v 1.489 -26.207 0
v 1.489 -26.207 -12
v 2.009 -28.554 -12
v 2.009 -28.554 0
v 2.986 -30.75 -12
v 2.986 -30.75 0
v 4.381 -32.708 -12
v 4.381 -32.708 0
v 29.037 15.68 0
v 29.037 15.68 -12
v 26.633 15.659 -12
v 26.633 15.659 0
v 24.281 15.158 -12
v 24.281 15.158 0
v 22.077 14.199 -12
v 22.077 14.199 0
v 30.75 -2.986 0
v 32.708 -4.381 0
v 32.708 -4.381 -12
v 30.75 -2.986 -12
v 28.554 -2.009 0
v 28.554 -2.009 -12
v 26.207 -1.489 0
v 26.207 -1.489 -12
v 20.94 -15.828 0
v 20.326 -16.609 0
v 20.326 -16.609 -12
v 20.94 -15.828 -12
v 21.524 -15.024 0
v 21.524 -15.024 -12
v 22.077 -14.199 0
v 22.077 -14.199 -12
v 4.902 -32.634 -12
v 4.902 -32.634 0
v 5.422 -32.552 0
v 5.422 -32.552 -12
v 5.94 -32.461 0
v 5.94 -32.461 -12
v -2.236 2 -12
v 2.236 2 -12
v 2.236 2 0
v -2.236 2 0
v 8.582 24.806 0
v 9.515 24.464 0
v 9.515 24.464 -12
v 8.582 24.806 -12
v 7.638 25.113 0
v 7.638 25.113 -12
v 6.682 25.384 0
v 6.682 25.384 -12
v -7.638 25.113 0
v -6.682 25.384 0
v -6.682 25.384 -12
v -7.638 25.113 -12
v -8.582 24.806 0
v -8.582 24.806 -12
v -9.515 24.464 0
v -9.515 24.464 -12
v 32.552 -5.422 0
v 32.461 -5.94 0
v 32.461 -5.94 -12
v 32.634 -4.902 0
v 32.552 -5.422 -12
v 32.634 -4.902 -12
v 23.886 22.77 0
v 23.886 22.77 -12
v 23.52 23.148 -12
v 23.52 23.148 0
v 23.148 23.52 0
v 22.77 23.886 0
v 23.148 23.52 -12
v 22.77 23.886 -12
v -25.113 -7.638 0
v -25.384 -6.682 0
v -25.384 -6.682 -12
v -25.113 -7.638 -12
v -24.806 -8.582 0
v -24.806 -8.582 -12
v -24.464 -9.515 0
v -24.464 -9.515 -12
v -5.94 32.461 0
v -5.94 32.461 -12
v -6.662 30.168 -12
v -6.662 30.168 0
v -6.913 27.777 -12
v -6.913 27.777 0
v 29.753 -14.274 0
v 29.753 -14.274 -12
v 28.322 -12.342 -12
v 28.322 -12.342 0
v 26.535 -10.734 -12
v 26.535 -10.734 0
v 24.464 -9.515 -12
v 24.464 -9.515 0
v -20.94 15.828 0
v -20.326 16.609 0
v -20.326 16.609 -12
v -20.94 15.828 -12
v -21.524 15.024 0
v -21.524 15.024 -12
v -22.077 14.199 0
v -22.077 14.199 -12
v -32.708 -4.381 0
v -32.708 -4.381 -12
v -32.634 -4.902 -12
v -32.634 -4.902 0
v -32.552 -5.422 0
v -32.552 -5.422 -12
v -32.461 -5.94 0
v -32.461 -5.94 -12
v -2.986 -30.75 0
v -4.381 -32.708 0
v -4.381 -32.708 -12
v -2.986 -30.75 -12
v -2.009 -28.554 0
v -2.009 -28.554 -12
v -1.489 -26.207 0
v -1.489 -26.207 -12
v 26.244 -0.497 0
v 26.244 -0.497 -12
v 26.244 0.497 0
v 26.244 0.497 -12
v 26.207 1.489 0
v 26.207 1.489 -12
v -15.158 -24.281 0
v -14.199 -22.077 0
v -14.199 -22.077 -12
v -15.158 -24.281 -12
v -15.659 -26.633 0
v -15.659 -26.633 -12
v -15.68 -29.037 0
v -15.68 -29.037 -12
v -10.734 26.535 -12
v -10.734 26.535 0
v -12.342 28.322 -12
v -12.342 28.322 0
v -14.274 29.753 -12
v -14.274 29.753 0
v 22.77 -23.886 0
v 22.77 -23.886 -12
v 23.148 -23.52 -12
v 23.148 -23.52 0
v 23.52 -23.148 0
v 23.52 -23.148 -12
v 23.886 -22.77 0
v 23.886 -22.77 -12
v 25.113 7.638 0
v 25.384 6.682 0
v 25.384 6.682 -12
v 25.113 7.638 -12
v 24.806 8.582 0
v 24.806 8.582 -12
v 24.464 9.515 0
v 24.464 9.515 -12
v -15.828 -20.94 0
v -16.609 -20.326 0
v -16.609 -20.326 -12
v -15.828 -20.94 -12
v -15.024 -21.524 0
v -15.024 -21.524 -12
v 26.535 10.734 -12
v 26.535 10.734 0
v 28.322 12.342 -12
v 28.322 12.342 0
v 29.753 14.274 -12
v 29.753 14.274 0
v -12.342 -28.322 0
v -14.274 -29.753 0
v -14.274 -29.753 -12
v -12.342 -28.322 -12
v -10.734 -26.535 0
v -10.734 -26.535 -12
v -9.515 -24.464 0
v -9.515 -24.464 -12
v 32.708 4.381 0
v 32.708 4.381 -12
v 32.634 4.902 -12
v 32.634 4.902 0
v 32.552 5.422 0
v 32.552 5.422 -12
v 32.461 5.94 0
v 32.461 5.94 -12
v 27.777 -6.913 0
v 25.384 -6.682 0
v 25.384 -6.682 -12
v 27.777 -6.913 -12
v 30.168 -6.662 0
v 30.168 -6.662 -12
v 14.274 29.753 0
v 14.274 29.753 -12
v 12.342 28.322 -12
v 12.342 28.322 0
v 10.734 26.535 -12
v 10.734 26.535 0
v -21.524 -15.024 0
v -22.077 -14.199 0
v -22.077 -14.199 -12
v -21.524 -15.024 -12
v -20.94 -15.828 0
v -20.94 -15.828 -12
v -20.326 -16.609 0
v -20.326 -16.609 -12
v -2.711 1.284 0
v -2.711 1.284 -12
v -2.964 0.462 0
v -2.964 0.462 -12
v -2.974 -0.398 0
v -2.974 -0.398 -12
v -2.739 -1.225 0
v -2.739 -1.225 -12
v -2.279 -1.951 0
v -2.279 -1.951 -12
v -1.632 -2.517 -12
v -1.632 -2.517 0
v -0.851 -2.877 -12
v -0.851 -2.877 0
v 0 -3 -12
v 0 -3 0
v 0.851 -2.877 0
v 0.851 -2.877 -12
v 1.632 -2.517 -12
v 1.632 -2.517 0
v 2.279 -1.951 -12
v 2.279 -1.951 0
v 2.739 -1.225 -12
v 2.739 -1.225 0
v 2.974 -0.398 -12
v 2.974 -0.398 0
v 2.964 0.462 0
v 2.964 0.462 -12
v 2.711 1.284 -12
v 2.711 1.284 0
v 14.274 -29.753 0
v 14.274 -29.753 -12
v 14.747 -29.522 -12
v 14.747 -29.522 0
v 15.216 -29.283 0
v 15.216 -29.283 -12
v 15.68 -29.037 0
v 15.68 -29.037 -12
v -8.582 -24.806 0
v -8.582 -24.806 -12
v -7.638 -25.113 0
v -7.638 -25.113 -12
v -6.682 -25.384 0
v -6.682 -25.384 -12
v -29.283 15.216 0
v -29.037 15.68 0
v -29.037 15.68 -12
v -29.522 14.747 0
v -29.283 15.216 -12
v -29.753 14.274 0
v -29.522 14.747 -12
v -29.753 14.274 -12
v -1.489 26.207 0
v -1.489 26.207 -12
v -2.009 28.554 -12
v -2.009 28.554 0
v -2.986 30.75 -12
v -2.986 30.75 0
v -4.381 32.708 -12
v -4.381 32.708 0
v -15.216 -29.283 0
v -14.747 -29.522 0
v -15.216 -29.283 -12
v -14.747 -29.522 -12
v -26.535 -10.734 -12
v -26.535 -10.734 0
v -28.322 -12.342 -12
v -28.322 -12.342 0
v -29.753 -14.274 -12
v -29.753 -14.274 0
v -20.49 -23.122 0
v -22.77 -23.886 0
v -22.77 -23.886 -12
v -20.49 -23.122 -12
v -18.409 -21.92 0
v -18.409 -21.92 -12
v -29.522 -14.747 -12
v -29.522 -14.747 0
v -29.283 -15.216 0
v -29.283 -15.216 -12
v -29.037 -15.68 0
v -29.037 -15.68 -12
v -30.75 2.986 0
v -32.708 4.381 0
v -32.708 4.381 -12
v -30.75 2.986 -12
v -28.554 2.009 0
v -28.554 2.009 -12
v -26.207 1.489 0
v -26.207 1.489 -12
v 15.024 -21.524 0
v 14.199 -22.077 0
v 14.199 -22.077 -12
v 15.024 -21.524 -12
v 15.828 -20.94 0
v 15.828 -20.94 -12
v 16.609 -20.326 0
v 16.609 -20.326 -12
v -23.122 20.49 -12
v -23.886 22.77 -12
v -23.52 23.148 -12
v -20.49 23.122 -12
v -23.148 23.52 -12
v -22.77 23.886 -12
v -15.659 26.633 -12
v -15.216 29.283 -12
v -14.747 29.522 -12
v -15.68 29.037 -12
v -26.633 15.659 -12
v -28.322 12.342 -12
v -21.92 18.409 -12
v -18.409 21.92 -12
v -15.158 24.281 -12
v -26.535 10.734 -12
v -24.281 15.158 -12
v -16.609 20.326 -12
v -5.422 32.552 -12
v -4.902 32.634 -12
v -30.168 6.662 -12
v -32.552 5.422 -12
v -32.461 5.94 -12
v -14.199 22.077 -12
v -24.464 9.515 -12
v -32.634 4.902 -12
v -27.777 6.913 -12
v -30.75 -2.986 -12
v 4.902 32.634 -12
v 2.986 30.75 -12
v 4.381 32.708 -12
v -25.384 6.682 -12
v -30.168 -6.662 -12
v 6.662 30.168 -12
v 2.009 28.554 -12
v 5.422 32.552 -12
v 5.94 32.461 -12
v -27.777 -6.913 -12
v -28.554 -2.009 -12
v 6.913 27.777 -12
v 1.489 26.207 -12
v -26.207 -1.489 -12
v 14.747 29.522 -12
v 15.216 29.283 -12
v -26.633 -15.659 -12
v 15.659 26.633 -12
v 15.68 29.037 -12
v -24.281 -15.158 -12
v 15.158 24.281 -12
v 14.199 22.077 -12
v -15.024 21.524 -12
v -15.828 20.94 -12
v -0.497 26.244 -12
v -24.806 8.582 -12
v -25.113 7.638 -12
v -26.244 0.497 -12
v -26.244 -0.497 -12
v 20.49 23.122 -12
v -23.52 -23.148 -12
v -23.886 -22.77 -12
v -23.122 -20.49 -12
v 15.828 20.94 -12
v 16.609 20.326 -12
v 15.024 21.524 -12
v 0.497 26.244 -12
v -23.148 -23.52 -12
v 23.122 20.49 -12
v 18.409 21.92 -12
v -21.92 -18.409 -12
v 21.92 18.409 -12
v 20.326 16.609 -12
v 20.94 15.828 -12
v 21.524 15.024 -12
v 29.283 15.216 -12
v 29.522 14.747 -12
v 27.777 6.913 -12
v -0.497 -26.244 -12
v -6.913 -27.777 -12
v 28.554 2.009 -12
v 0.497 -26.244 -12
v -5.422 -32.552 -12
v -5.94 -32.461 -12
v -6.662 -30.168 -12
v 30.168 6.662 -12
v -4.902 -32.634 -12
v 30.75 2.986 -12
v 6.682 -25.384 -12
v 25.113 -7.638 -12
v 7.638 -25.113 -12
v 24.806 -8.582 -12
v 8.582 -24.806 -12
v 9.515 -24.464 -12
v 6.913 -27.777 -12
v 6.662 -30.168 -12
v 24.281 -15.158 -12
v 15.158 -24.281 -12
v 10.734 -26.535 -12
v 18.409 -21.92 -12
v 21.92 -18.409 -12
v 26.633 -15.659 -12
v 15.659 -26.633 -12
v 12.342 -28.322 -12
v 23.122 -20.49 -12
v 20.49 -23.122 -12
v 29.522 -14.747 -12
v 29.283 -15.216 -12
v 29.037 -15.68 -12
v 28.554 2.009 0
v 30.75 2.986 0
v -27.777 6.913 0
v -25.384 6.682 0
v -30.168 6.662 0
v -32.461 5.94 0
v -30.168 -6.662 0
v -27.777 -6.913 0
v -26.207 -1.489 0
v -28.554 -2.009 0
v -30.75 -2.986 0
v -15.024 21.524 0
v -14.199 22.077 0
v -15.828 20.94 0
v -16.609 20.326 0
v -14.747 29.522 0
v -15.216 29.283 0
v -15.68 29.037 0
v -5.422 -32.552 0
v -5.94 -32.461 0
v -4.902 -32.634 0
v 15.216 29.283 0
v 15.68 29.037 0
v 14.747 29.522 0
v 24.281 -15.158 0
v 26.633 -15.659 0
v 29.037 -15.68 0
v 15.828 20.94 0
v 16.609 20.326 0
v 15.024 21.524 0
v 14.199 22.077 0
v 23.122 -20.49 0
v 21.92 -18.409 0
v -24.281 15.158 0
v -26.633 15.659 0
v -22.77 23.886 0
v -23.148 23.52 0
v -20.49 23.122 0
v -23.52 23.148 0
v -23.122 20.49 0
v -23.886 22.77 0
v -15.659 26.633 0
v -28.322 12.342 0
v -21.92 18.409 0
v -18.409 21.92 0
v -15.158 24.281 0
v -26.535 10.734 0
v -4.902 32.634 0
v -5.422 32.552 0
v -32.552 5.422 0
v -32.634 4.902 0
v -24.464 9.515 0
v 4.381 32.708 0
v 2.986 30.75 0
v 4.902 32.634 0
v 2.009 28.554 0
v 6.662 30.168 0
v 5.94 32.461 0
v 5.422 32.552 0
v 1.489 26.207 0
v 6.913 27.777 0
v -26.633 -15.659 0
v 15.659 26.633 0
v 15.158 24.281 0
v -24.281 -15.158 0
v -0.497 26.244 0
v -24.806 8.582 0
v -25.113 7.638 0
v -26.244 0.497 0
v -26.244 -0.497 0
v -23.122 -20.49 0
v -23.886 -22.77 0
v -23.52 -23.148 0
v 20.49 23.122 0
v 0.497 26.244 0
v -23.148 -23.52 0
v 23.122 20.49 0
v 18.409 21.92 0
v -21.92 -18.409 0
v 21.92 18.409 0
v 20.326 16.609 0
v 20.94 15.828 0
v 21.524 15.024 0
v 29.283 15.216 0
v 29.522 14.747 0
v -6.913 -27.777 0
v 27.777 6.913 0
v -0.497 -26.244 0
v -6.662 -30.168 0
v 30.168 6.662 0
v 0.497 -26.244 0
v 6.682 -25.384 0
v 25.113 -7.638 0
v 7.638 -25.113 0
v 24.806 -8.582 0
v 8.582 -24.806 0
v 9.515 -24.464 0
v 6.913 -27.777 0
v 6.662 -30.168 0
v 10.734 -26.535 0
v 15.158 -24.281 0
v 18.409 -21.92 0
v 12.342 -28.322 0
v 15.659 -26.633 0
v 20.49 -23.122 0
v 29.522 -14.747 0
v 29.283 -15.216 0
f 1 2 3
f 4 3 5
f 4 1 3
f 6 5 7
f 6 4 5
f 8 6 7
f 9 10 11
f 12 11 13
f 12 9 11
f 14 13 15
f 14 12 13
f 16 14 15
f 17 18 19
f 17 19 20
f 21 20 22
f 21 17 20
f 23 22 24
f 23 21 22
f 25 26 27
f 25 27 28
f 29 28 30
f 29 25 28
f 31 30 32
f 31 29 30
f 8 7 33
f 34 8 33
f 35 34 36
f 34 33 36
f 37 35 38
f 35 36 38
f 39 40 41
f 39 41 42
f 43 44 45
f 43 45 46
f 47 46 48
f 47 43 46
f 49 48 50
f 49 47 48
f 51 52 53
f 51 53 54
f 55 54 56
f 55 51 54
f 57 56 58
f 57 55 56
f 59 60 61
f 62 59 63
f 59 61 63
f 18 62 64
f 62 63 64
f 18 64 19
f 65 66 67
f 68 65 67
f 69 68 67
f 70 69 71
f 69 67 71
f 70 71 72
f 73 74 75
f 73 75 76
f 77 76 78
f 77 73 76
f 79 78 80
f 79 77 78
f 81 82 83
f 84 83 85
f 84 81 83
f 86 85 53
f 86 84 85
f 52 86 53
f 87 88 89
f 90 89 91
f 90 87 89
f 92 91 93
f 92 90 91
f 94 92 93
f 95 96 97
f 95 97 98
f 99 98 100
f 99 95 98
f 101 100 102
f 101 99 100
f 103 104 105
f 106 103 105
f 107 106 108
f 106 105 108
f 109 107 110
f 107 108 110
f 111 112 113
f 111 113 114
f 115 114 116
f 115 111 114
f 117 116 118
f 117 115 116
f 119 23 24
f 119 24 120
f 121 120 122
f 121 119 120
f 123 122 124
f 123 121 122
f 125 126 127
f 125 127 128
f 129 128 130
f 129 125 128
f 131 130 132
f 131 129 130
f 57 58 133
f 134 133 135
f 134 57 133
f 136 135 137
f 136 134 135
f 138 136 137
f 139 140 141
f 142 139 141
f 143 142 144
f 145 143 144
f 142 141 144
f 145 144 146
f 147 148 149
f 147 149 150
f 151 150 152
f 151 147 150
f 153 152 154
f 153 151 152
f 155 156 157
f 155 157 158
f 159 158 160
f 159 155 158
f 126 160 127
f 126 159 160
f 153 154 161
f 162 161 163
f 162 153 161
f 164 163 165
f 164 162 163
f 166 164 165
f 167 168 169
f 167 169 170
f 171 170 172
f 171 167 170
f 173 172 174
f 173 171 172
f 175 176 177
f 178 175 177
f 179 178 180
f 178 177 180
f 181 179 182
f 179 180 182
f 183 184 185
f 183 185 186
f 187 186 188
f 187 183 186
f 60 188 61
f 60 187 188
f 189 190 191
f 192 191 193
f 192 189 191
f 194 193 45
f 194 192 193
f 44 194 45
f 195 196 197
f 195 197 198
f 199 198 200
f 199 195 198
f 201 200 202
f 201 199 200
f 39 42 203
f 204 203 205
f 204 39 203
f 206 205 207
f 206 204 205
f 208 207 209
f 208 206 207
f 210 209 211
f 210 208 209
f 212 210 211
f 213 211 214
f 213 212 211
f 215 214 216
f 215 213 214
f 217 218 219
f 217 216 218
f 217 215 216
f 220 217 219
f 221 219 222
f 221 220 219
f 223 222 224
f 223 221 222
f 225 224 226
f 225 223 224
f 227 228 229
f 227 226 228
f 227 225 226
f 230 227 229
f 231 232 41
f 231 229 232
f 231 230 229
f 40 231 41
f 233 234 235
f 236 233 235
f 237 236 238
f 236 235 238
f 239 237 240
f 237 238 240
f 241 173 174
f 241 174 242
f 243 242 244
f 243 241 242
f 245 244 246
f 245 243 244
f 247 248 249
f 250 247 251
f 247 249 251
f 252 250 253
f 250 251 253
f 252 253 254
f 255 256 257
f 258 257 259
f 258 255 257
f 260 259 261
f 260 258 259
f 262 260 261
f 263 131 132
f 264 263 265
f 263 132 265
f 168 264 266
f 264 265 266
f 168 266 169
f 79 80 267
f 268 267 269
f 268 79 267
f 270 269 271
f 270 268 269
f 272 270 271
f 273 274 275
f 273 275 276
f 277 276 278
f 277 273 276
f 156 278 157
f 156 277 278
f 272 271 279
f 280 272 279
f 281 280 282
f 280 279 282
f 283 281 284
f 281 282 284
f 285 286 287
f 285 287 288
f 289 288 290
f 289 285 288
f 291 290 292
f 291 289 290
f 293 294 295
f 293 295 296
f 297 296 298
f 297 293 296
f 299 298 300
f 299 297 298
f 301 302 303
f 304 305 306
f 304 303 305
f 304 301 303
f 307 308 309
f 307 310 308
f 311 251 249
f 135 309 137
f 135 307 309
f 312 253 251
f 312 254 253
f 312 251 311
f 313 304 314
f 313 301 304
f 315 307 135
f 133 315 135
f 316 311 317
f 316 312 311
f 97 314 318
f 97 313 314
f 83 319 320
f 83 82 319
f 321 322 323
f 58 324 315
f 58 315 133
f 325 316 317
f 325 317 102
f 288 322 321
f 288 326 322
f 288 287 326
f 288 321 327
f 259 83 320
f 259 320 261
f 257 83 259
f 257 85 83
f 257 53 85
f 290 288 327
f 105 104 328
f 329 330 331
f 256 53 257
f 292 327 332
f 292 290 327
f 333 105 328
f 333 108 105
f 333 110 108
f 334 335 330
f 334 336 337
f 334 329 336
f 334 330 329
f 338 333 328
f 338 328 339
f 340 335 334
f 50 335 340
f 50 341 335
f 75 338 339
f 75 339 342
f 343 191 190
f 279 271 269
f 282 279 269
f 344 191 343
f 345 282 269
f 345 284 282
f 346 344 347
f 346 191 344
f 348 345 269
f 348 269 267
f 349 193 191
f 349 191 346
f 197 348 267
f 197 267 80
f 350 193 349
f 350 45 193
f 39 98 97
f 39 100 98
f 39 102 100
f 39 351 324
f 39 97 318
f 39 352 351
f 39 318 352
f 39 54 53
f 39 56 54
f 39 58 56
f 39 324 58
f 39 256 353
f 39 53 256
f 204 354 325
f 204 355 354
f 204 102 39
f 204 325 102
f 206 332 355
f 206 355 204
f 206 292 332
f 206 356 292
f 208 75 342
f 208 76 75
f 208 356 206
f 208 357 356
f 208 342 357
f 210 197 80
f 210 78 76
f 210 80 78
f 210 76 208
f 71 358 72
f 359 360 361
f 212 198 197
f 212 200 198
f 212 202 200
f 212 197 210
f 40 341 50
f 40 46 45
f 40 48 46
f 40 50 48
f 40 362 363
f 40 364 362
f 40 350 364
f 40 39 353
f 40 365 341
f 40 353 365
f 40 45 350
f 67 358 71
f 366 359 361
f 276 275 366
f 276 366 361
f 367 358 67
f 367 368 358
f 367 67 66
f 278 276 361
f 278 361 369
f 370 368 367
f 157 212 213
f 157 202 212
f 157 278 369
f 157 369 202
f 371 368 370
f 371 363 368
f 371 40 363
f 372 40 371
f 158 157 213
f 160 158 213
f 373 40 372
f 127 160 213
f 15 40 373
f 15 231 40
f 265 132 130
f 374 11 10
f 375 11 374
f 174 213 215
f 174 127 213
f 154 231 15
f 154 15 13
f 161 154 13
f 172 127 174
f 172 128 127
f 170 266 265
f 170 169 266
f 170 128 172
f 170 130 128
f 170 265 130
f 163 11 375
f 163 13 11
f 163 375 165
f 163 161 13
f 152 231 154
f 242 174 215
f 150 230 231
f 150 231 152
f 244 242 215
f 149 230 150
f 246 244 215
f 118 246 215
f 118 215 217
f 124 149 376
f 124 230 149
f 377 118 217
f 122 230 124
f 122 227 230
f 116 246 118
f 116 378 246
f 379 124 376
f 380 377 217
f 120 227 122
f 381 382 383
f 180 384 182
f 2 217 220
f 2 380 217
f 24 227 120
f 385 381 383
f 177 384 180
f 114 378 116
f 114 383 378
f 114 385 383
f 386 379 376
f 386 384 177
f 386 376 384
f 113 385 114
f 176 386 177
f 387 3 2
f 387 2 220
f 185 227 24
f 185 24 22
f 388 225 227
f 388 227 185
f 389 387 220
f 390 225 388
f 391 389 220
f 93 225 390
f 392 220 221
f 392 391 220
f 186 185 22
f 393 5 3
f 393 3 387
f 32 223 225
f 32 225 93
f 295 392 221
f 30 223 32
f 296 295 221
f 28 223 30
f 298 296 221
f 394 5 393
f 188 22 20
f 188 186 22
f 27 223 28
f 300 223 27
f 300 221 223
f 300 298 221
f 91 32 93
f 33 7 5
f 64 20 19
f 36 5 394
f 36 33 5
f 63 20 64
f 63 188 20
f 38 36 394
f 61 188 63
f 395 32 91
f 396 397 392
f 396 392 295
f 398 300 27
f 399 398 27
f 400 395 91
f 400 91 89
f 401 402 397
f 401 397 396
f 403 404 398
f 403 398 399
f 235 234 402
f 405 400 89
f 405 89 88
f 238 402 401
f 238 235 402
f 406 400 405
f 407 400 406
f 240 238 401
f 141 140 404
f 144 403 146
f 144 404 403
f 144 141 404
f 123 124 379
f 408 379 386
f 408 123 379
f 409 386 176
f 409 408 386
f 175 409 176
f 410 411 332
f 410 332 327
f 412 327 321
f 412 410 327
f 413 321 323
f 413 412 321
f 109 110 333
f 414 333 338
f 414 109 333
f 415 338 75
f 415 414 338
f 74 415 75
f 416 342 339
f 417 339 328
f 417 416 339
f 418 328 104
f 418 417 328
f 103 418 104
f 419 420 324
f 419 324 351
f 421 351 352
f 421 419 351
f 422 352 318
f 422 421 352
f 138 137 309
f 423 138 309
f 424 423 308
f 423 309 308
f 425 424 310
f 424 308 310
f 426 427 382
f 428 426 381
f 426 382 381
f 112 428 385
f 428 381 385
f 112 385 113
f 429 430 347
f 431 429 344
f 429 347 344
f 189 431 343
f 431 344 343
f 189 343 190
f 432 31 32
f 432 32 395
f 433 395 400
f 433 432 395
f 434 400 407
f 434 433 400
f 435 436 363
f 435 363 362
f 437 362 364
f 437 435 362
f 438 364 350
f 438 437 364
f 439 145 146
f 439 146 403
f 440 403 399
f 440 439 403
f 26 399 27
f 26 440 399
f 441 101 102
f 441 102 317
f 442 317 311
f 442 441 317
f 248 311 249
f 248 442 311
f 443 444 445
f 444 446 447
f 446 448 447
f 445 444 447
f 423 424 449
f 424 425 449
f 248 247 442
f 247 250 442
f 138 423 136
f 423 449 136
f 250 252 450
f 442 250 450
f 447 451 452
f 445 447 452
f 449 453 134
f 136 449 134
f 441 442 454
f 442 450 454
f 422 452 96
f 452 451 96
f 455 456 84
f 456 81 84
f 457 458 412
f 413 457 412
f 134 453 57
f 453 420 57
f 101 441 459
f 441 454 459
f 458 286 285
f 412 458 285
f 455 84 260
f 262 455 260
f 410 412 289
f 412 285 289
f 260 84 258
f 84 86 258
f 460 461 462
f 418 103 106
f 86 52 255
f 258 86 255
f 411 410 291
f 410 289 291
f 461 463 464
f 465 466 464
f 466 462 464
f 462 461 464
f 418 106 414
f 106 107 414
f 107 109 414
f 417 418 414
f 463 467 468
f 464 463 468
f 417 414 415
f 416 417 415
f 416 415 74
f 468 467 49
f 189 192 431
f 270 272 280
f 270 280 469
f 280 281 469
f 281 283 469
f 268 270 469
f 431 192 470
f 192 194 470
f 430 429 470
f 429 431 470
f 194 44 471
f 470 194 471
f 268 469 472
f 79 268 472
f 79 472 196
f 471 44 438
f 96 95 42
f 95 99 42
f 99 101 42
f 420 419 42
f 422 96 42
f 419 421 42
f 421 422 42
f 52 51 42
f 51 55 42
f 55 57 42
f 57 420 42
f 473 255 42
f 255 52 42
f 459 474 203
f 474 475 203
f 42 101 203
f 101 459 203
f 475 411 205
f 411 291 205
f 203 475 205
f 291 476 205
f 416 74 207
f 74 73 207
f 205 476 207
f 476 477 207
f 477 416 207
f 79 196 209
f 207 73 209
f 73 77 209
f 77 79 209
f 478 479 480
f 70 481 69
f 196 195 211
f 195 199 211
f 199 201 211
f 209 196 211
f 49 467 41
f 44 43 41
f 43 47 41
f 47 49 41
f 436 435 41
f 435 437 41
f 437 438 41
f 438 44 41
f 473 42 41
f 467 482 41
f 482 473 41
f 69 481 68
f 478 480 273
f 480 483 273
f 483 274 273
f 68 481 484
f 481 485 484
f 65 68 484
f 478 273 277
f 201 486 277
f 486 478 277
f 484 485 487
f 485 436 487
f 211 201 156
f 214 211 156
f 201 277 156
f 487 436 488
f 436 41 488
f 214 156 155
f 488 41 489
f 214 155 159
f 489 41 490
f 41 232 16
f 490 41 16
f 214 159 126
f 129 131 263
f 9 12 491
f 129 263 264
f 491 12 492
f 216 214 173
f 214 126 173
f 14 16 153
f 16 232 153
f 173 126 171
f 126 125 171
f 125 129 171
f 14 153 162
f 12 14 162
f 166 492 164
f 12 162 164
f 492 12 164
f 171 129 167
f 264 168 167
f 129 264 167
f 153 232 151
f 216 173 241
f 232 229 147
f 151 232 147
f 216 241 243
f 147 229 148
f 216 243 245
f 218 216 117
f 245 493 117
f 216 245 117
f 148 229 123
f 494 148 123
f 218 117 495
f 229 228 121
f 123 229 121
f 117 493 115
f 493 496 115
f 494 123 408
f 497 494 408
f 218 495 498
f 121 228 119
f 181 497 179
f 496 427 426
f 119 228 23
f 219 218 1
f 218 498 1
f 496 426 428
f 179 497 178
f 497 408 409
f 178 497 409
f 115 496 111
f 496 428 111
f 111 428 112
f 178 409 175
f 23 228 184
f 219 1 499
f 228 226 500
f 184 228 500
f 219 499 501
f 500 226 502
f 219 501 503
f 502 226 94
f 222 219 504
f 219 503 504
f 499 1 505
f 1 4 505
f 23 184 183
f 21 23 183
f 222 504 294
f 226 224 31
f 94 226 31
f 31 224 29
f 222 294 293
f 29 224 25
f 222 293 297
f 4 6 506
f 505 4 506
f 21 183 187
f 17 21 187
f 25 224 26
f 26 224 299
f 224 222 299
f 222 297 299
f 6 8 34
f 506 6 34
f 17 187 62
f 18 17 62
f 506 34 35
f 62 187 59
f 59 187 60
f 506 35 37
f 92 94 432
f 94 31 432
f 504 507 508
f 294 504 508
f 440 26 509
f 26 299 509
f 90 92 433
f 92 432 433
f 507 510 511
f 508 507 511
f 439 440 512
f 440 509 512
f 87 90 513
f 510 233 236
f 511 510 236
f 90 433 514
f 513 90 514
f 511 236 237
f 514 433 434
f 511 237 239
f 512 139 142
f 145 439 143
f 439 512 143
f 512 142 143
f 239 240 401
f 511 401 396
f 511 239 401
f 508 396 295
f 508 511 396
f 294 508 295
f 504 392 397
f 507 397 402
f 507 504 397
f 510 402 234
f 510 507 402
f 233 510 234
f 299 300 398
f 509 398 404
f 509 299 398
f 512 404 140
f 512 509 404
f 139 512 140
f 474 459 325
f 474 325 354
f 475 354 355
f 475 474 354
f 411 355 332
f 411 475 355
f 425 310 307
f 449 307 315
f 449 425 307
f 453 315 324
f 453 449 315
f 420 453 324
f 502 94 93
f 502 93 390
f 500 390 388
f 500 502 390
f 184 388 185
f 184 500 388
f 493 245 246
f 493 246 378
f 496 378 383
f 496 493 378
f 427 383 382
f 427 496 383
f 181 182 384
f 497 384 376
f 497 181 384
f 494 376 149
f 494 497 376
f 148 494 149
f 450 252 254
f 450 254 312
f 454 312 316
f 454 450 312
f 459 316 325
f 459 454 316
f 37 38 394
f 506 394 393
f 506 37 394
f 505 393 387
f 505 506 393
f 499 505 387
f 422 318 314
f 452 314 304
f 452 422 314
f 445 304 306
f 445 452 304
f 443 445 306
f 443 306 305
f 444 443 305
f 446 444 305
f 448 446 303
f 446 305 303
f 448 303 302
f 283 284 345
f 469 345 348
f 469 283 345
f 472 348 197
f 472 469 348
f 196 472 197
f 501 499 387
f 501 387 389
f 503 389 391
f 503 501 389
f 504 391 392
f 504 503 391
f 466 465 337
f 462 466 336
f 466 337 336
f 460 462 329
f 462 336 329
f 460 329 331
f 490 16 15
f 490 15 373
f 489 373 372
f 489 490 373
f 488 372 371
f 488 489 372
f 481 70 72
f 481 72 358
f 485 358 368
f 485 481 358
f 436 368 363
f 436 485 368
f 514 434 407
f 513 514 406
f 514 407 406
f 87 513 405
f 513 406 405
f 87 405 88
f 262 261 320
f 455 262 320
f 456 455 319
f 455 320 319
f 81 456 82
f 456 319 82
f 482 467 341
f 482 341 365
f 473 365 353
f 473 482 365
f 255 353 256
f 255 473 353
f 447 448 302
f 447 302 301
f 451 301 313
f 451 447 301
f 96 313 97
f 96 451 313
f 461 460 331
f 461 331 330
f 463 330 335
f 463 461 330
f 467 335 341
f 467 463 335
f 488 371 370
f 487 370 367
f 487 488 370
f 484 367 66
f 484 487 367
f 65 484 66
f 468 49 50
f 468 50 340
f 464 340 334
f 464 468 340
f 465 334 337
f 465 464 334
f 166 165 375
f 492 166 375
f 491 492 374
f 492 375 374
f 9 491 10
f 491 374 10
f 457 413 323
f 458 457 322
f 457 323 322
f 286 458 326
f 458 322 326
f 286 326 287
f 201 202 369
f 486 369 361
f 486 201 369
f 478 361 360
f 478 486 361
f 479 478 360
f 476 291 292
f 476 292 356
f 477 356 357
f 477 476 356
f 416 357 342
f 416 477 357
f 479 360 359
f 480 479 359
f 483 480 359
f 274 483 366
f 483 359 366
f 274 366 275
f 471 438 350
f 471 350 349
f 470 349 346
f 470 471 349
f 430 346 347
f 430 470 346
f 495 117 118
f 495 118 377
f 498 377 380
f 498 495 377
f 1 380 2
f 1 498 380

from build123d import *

# Parameters (mm, degrees)
ESBO_O1_W             = 33
ESBO_O1_H             = 12
CORTE_EXTRUS_O2_DEPTH = 49.187135213
CORTE_EXTRUS_O3_DEPTH = 49.187135213
PADR_OCIRCULAR2_COUNT = 20


with BuildPart() as part:
    # Esboço1 → Revolução1 (revolve)
    with BuildSketch(Plane(origin=(0, 0, 0), x_dir=(1, 0, 0), z_dir=(0, 1, 0)), mode=Mode.PRIVATE) as revolu_o1_sk:
        with Locations((16.5, 6)):
            Rectangle(ESBO_O1_W, ESBO_O1_H)
    revolve(revolu_o1_sk.sketch.rotate(Axis((0, 0, 0), (0, 0, 1)), 180), axis=Axis((0, 0, 0), (0, 0, 1)))

    # Esboço3 → Corte-extrusão2 (cut, through all)
    with BuildSketch(Plane(origin=(0, 0, -12), x_dir=(-1, 0, 0), z_dir=(0, 0, -1))):
        with BuildLine():
            Line((-2.236067977, 2), (2.236067977, 2))
            ThreePointArc((2.236067977, 2), (0, -3), (-2.236067977, 2))
        make_face()
    extrude(amount=-CORTE_EXTRUS_O2_DEPTH, mode=Mode.SUBTRACT)

    # Esboço2 → Corte-extrusão3 (cut, through all)
    with BuildSketch(Plane.XY):
        with BuildLine():
            ThreePointArc((1.489278925, 26.206717637), (0, 26.249), (-1.489278925, 26.206717637))
            ThreePointArc((-1.489278925, 26.206717637), (-2.448651415, 29.690511169), (-4.401620335, 32.730762038))
            ThreePointArc((-4.401620335, 32.730762038), (0, 33.0254), (4.401620335, 32.730762038))
            ThreePointArc((4.401620335, 32.730762038), (2.448651415, 29.690511169), (1.489278925, 26.206717637))
        make_face()
    corte_extrus_o3 = extrude(amount=-CORTE_EXTRUS_O3_DEPTH, mode=Mode.SUBTRACT)

    # PadrãoCircular2: Corte-extrusão3 ×20 about axis
    padr_ocircular2_axis = Axis((0, 0, 0), (0, 0, 1))
    for i in range(1, PADR_OCIRCULAR2_COUNT):
        add(corte_extrus_o3.rotate(padr_ocircular2_axis, i * 360 / PADR_OCIRCULAR2_COUNT), mode=Mode.SUBTRACT)


solid = part.part
